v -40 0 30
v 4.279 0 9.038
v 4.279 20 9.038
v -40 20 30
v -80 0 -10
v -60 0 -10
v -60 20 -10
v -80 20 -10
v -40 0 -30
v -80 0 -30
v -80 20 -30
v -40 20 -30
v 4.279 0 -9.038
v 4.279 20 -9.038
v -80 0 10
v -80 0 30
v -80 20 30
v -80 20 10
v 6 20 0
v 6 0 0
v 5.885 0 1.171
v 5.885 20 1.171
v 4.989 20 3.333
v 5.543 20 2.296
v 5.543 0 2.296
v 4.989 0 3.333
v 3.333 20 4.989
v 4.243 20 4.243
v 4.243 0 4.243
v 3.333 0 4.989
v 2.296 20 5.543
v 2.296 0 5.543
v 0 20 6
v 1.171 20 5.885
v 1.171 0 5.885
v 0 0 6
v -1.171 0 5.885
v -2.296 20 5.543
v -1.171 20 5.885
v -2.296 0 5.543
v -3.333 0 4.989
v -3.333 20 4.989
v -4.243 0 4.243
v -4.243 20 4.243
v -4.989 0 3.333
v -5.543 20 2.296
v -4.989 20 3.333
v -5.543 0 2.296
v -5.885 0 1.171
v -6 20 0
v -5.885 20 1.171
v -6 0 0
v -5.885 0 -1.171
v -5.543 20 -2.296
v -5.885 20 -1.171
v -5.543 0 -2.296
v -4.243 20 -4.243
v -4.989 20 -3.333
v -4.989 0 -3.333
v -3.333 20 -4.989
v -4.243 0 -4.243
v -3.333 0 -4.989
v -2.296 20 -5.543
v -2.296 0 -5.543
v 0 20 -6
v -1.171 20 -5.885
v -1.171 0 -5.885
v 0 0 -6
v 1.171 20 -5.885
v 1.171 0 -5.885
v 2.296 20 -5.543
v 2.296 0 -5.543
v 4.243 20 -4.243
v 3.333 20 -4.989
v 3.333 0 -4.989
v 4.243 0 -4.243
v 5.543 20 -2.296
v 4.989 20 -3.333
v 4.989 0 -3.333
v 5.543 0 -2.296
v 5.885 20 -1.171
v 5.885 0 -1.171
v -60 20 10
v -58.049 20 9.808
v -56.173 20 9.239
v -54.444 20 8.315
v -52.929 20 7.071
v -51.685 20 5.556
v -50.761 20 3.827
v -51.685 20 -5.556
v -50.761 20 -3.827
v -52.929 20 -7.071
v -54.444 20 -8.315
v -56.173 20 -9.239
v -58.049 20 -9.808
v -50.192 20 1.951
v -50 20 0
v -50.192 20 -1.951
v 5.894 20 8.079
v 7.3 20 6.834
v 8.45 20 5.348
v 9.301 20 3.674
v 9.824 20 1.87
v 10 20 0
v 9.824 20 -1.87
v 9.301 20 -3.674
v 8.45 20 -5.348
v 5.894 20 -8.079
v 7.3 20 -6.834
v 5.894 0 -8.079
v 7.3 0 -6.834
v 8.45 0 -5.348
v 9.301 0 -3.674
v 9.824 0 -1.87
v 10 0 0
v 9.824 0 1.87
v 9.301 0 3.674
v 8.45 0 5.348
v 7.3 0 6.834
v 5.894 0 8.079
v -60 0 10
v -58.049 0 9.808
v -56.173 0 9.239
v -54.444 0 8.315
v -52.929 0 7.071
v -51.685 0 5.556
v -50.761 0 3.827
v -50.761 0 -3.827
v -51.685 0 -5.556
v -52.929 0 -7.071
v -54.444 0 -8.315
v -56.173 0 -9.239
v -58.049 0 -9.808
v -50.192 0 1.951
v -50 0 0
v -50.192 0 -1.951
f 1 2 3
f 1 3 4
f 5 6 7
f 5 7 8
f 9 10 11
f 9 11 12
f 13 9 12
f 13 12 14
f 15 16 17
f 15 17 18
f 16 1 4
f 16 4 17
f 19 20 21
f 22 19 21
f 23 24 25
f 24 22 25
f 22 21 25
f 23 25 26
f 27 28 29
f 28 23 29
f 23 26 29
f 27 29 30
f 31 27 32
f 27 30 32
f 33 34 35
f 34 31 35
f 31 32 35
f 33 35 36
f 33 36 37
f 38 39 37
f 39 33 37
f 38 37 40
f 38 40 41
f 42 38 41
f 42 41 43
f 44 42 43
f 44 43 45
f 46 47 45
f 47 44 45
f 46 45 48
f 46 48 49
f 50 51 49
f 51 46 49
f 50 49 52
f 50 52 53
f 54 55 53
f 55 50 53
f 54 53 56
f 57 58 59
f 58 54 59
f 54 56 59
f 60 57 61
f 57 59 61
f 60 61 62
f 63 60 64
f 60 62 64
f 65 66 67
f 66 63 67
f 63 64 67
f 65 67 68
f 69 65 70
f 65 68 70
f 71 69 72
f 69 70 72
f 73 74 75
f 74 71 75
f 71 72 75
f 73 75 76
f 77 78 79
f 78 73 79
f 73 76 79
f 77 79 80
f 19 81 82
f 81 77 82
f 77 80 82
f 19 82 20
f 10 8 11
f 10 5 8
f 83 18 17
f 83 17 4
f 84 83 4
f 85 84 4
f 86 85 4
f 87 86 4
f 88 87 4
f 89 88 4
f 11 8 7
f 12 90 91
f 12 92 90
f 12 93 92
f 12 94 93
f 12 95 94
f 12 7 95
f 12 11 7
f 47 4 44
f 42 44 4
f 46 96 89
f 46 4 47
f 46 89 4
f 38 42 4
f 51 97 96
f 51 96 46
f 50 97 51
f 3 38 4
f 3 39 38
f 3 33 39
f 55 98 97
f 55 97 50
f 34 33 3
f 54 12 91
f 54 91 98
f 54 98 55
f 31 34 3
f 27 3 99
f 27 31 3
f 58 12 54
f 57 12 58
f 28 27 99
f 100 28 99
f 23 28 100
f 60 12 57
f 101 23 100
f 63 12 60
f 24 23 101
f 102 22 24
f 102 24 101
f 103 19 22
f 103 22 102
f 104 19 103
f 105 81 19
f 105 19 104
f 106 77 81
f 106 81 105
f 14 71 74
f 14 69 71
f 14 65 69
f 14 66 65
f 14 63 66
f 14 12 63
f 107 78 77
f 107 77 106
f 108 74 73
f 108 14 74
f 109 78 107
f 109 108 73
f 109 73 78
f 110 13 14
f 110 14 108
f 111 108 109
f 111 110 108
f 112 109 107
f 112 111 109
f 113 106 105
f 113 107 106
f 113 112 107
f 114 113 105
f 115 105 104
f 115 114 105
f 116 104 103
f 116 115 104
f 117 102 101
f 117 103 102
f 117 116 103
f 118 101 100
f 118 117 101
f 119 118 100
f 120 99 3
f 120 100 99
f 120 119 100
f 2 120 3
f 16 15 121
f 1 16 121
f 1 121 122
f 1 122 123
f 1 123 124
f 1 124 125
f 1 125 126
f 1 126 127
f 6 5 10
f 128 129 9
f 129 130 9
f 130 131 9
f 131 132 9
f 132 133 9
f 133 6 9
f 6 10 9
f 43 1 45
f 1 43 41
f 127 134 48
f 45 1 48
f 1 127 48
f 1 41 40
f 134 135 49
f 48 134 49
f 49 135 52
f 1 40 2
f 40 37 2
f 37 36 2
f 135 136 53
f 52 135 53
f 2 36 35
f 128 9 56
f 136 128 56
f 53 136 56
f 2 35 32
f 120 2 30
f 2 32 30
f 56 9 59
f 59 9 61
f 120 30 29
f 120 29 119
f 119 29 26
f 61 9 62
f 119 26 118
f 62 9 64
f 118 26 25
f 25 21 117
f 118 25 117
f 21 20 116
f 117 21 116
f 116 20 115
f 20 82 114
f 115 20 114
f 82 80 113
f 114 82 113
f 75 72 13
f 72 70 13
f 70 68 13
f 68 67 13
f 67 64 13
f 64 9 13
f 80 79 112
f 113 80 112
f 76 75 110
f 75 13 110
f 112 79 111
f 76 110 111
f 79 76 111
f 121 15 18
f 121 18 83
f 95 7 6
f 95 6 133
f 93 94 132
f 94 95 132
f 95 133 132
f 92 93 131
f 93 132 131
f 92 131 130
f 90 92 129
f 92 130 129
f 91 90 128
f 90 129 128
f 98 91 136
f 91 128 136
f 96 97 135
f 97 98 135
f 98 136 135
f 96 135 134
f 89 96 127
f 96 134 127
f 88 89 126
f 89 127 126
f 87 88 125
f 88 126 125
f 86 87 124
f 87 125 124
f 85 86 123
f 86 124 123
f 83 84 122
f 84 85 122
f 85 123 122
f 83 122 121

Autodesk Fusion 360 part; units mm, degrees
sketch "Sketch2" plane through (0, 0, 0) normal (0, 1, 0) x (1, 0, 0)
  line L0 (-80, 30) -> (-40, 30)
  line L1 (-40, 30) -> (4.2788, 9.0384)
  arc A0 (4.2788, -9.0384) -> (4.2788, 9.0384) centre (0, 0) ccw
  line L2 (4.2788, -9.0384) -> (-40, -30)
  line L3 (-40, -30) -> (-80, -30)
  circle A1 centre (0, 0) radius 6
  line L4 (-80, -10) -> (-60, -10)
  arc A2 (-60, -10) -> (-60, 10) centre (-60, 0) ccw
  line L5 (-60, 10) -> (-80, 10)
  line L6 (-80, -30) -> (-80, -10)
  line L7 (-80, 10) -> (-80, 30)
  line L8 (0, 0) -> (-89, 0) construction
  dimension "d22" = 12
  dimension "d23" = 10
  dimension "d24" = 20
  dimension "d25" = 20
  dimension "d26" = 40
  dimension "d27" = 60
  dimension "d28" = 80
  dimension "d29" = 10
extrude "Extrude2" add sketch "Sketch2" along normal blind 20
